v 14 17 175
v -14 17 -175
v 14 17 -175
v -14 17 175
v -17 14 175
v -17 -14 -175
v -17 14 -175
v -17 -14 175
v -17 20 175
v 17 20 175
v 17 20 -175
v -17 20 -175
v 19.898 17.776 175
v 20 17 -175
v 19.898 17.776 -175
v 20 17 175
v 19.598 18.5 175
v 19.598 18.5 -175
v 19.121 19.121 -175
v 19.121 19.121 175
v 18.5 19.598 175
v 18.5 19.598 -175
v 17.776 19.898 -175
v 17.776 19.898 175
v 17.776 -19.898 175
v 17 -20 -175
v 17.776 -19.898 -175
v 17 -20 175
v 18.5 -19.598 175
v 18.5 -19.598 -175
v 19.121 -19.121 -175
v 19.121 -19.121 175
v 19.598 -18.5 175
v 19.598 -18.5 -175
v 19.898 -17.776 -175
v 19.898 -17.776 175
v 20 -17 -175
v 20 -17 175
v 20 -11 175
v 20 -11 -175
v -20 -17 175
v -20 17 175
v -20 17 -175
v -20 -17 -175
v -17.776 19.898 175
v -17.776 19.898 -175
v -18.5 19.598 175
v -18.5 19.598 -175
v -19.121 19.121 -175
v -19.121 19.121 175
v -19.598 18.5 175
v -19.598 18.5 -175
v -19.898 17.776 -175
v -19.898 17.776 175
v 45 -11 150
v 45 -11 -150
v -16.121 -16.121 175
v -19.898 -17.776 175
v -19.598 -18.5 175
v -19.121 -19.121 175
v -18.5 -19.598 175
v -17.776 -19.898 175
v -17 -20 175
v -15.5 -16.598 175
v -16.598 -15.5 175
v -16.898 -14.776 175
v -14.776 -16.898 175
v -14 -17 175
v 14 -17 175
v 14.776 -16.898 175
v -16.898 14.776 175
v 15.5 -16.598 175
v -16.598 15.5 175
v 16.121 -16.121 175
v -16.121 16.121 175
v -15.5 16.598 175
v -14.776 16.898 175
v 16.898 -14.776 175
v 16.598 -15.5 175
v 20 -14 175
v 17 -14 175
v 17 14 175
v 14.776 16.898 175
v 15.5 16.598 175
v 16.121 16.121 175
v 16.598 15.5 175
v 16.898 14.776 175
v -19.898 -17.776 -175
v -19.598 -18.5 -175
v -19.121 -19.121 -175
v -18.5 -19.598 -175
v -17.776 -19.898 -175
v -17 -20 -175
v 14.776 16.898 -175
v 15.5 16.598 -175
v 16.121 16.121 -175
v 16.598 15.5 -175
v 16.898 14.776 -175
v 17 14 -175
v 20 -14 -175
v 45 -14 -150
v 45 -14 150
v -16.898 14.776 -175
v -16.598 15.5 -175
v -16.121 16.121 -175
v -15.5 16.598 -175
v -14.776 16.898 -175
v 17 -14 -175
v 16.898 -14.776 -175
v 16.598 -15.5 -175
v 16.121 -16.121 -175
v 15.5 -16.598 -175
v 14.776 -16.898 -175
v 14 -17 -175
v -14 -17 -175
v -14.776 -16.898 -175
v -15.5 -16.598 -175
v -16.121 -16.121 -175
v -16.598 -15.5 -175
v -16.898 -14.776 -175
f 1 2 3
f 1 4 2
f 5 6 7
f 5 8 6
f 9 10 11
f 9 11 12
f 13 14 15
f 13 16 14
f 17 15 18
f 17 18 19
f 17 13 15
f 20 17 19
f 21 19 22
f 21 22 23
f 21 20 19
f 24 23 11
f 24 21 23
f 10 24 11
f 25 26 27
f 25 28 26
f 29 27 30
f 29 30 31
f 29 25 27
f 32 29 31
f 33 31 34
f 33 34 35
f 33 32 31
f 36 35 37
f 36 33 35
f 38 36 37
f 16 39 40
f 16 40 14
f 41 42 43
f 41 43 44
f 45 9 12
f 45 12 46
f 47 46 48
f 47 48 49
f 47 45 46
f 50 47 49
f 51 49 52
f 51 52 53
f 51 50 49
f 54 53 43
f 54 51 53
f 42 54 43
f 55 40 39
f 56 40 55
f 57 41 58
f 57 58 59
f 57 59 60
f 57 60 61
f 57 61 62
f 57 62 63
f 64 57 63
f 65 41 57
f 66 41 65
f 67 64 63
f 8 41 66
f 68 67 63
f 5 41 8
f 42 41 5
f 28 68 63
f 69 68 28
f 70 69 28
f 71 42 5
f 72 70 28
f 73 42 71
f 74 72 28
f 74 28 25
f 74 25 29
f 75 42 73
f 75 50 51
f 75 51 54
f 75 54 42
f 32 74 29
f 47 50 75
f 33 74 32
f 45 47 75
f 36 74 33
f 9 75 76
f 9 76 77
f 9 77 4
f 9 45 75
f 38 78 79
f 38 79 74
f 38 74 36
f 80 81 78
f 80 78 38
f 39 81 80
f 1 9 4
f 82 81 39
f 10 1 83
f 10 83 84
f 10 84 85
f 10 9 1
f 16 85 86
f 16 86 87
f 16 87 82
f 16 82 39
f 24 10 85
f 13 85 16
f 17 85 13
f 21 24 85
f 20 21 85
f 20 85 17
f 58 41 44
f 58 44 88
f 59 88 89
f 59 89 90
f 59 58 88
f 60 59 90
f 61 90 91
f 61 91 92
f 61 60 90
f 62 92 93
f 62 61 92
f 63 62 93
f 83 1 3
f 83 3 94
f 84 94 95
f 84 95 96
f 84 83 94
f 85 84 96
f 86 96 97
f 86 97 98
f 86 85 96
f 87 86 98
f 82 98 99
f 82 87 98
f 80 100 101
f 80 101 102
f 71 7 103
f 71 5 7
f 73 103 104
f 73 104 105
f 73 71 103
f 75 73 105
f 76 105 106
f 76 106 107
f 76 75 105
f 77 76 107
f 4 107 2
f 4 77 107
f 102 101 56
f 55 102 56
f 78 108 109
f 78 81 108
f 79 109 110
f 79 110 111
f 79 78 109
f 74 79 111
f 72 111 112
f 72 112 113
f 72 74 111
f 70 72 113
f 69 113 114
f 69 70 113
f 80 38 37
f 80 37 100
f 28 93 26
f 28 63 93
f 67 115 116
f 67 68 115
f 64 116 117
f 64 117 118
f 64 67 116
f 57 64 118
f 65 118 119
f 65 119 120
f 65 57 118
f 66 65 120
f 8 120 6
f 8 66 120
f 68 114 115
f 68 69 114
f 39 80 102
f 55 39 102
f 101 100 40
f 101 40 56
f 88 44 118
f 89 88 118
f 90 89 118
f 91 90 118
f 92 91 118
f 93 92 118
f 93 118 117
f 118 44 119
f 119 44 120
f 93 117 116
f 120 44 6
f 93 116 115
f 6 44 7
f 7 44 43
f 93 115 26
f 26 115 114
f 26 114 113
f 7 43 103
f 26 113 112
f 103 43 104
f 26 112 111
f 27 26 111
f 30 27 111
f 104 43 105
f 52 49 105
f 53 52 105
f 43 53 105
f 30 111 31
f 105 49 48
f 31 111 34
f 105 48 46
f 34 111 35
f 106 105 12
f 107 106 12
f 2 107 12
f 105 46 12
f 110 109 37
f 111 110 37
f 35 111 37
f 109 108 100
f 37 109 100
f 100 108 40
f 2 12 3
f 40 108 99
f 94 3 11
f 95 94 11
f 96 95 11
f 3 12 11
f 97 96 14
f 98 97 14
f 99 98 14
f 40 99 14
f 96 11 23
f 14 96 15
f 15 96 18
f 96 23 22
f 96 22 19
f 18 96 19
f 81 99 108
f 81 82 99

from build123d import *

# Parameters (mm, degrees)
F1_DEPTH = 175
F2_W     = 3
F2_H     = 350
F3_DEPTH = 25
F5_DEPTH = 34.001


# Not quite as in the source:
# - a pattern or mirror of a feature is missing from the dataset's text; its kind, count and spacing are read off the source's solid


with BuildPart() as f1:
    # F0 (on Top) → F1 (new body, symmetric)
    with BuildSketch(Plane.XY):
        with BuildLine():
            ThreePointArc((20, 17), (19.1213203436, 19.1213203436), (17, 20))
            Line((17, 20), (-17, 20))
            ThreePointArc((-17, 20), (-19.1213203436, 19.1213203436), (-20, 17))
            Line((-20, 17), (-20, -17))
            ThreePointArc((-20, -17), (-19.1213203436, -19.1213203436), (-17, -20))
            Line((-17, -20), (17, -20))
            ThreePointArc((17, -20), (19.1213203436, -19.1213203436), (20, -17))
            Line((20, -17), (20, 17))
        make_face()
        with BuildLine():
            ThreePointArc((14, 17), (16.1213203436, 16.1213203436), (17, 14))
            Line((17, 14), (17, -14))
            ThreePointArc((17, -14), (16.1213203436, -16.1213203436), (14, -17))
            Line((14, -17), (-14, -17))
            ThreePointArc((-14, -17), (-16.1213203436, -16.1213203436), (-17, -14))
            Line((-17, -14), (-17, 14))
            ThreePointArc((-17, 14), (-16.1213203436, 16.1213203436), (-14, 17))
            Line((-14, 17), (14, 17))
        make_face(mode=Mode.SUBTRACT)
    extrude(amount=F1_DEPTH, both=True)

    # F2 (on face) → F3 (join)
    with BuildSketch(Plane.YZ.offset(20)):
        with Locations((-12.5, 0)):
            Rectangle(F2_W, F2_H)
    extrude(amount=F3_DEPTH)

    # F4 (on face) → F5 (cut, through all)
    with BuildSketch(Plane.XZ.offset(14)):
        Polygon((45, 175), (20, 175), (45, 150), align=None)
    f5 = extrude(amount=-F5_DEPTH, mode=Mode.SUBTRACT)

    # F5_copies: F5 across plane
    add(f5.mirror(Plane(origin=(0, 0, 0), x_dir=(-1, 0, 0), z_dir=(0, 0, -1))), mode=Mode.SUBTRACT)


solid = f1.part
